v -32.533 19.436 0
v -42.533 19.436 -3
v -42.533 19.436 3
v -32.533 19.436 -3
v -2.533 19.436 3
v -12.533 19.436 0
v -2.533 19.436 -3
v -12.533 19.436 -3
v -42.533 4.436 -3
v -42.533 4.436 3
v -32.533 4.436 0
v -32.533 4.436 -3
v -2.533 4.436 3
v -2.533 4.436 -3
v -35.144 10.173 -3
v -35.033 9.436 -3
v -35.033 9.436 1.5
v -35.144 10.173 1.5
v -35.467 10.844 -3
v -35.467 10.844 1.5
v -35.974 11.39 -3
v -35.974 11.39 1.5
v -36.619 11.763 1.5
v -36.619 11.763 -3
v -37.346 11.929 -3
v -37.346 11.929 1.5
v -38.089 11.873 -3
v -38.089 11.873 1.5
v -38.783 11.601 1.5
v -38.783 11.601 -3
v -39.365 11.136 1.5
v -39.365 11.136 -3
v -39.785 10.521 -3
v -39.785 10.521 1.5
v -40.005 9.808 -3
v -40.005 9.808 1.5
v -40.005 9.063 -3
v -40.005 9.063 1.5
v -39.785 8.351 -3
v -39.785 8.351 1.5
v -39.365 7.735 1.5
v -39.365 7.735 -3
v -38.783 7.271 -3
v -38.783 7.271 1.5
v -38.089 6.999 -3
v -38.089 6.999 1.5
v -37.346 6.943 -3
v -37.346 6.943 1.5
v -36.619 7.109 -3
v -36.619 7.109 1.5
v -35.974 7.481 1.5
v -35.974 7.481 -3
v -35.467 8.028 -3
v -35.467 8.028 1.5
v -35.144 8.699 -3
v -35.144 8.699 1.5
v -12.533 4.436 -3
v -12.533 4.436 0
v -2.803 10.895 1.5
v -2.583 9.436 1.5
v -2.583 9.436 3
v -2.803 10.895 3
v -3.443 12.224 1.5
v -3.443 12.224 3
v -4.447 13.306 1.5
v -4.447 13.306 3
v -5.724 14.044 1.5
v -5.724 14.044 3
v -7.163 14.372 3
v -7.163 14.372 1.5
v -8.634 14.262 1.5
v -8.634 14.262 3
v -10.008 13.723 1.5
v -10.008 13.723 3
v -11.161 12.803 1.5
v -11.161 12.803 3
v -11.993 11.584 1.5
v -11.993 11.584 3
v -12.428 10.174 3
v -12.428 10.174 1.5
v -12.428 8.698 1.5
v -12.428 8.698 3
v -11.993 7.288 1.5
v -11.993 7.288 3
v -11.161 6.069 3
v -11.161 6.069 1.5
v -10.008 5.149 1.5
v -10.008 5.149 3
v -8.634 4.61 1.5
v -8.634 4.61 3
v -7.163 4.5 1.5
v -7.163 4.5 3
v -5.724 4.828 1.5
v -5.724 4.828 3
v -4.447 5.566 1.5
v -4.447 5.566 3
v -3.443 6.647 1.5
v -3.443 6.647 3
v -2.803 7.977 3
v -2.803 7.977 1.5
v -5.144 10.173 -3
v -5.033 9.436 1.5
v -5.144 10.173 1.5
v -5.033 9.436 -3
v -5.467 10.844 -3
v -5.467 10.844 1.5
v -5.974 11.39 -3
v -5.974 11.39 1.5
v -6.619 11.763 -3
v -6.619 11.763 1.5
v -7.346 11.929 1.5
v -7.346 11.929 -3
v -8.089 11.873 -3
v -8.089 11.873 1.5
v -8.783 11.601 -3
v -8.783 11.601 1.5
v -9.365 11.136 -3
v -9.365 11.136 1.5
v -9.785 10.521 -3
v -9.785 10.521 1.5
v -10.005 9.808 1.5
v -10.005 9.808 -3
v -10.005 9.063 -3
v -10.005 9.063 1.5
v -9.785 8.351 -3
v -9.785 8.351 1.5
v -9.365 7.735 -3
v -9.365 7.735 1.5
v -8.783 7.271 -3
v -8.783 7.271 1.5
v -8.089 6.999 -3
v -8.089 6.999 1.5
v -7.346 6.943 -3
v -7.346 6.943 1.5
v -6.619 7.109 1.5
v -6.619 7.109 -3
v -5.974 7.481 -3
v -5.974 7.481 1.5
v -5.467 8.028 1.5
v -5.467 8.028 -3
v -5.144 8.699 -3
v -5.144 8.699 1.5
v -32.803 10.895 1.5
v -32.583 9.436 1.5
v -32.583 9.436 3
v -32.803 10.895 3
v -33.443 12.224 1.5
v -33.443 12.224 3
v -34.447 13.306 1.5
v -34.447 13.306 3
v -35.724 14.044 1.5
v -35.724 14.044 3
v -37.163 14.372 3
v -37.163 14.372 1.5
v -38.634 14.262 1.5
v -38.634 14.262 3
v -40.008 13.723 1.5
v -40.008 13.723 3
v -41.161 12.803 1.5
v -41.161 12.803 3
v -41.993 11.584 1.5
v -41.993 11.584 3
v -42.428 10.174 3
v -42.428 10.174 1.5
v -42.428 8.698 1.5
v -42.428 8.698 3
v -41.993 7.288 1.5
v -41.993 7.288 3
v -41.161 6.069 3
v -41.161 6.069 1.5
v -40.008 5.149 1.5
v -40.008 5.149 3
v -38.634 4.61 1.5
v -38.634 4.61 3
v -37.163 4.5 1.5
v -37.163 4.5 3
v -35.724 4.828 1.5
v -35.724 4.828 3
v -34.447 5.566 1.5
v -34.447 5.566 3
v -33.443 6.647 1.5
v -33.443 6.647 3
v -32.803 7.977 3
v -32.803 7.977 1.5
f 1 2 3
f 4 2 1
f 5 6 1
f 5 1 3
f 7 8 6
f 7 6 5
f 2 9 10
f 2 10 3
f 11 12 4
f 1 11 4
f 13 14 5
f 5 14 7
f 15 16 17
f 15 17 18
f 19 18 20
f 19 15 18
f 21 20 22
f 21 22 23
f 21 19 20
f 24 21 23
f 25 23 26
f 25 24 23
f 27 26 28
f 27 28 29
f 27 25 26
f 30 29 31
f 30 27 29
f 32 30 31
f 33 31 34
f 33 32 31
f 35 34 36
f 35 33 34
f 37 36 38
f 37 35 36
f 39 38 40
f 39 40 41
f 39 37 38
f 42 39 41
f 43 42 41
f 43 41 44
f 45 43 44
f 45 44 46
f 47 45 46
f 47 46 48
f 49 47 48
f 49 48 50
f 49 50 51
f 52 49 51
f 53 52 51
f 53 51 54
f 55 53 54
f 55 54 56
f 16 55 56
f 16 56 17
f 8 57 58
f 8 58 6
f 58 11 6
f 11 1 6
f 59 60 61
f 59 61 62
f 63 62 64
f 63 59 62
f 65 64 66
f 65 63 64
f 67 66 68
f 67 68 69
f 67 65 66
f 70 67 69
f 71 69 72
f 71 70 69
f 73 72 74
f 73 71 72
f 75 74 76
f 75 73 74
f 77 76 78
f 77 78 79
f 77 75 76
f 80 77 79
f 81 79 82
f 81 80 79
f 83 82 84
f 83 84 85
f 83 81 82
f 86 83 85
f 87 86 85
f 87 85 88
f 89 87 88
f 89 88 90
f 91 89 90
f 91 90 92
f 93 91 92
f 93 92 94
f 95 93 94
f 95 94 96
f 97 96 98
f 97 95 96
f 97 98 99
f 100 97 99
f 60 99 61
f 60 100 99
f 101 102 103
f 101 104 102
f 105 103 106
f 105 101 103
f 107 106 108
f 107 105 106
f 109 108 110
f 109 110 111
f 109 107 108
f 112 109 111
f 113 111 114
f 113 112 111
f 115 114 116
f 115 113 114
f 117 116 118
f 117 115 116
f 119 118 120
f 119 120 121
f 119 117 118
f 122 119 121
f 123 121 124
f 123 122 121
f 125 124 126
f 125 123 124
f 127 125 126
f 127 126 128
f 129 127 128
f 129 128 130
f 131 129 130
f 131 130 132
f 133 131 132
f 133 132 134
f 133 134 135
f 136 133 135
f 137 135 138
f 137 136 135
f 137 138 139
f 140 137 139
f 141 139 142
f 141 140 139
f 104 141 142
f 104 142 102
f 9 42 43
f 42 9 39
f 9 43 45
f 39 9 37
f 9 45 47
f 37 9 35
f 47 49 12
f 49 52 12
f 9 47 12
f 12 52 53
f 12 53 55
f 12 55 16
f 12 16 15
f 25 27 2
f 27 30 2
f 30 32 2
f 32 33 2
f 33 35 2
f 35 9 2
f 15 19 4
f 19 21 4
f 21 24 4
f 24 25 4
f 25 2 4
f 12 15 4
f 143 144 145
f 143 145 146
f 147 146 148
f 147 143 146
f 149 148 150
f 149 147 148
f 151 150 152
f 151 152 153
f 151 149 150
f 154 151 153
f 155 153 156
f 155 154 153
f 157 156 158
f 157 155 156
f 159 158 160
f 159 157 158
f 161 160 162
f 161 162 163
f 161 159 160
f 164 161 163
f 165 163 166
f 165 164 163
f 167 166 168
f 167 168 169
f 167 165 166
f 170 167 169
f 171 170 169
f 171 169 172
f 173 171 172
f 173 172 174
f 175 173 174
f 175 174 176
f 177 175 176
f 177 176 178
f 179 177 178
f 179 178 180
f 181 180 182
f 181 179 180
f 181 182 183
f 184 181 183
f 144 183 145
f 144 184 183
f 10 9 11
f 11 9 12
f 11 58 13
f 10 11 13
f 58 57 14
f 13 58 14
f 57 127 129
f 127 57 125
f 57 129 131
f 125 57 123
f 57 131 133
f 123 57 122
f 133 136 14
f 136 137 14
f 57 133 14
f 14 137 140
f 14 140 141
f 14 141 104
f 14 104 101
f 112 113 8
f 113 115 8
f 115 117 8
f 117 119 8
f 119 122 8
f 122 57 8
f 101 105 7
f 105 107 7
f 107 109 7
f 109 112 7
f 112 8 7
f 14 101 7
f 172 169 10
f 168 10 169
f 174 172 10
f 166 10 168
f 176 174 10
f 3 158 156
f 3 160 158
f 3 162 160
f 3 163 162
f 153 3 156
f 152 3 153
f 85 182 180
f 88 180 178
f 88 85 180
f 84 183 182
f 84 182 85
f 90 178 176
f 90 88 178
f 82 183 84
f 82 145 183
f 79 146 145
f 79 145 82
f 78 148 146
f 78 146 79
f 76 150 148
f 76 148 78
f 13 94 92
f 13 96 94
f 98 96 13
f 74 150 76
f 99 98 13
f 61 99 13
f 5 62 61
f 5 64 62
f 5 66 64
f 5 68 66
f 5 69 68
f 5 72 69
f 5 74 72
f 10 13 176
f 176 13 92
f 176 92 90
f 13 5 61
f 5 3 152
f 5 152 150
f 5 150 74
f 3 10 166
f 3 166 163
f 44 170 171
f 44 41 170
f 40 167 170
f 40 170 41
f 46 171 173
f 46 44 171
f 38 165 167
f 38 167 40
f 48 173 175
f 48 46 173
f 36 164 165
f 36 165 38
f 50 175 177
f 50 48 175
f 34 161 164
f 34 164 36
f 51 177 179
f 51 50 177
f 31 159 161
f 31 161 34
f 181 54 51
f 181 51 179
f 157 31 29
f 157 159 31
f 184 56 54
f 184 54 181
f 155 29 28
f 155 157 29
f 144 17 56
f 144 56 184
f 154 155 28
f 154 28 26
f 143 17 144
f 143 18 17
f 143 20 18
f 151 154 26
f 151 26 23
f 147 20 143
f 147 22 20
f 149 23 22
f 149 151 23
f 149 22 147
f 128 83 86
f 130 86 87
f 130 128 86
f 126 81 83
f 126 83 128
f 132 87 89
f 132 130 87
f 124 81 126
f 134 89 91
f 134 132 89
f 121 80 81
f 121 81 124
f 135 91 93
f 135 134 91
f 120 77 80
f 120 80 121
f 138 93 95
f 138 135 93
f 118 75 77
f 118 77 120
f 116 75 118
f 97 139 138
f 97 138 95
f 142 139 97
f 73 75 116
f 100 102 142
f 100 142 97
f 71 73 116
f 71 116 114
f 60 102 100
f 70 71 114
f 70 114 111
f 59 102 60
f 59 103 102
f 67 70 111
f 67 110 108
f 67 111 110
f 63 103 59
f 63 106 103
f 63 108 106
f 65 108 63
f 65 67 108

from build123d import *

# Parameters (mm, degrees)
SKETCH1_W           = 10
SKETCH1_H           = 15
SKETCH1_R           = 4.95
SKETCH1_R_2         = 2.5
BOSS_EXTRUDE1_DEPTH = 3
BOSS_EXTRUDE2_START = -3
SKETCH1_3_W         = 10
SKETCH1_3_H         = 15
SKETCH1_3_R         = 4.95
SKETCH1_3_R_2       = 2.5
BOSS_EXTRUDE2_DEPTH = 3
CUT_EXTRUDE1_START  = 1.5
SKETCH1_4_R         = 4.95
SKETCH1_4_R_2       = 2.5
CUT_EXTRUDE1_DEPTH  = 1.5


with BuildPart() as part:
    # Sketch1 → Boss-Extrude1 (new body)
    # profile 1 of 6: a face of its own
    with BuildSketch(Plane.XY):
        with Locations((-37.532834977, 11.935892272)):
            Rectangle(SKETCH1_W, SKETCH1_H)
        with Locations((-37.532834977, 9.435892272)):
            Circle(SKETCH1_R, mode=Mode.SUBTRACT)
    # profile 2 of 6: a face of its own
    with BuildSketch(Plane.XY):
        with Locations((-37.532834977, 9.435892272)):
            Circle(SKETCH1_R)
        with Locations((-37.532834977, 9.435892272)):
            Circle(SKETCH1_R_2, mode=Mode.SUBTRACT)
    # profile 3 of 6: a face of its own
    with BuildSketch(Plane.XY):
        with Locations((-7.532834977, 11.935892272)):
            Rectangle(SKETCH1_W, SKETCH1_H)
        with Locations((-7.532834977, 9.435892272)):
            Circle(SKETCH1_R, mode=Mode.SUBTRACT)
    # profile 4 of 6: a face of its own
    with BuildSketch(Plane.XY):
        with Locations((-7.532834977, 9.435892272)):
            Circle(SKETCH1_R)
        with Locations((-7.532834977, 9.435892272)):
            Circle(SKETCH1_R_2, mode=Mode.SUBTRACT)
    # profile 5 of 6: a face of its own
    with BuildSketch(Plane.XY):
        with Locations((-17.532834977, 11.935892272)):
            Rectangle(SKETCH1_W, SKETCH1_H)
    # profile 6 of 6: a face of its own
    with BuildSketch(Plane.XY):
        with Locations((-27.532834977, 11.935892272)):
            Rectangle(SKETCH1_W, SKETCH1_H)
    extrude(amount=BOSS_EXTRUDE1_DEPTH)

    # Sketch1<3> → Boss-Extrude2 (add)
    # profile 1 of 4: a face of its own
    with BuildSketch(Plane.XY.offset(BOSS_EXTRUDE2_START)):
        with Locations((-37.532834977, 11.935892272)):
            Rectangle(SKETCH1_3_W, SKETCH1_3_H)
        with Locations((-37.532834977, 9.435892272)):
            Circle(SKETCH1_3_R, mode=Mode.SUBTRACT)
    # profile 2 of 4: a face of its own
    with BuildSketch(Plane.XY.offset(BOSS_EXTRUDE2_START)):
        with Locations((-37.532834977, 9.435892272)):
            Circle(SKETCH1_3_R)
        with Locations((-37.532834977, 9.435892272)):
            Circle(SKETCH1_3_R_2, mode=Mode.SUBTRACT)
    # profile 3 of 4: a face of its own
    with BuildSketch(Plane.XY.offset(BOSS_EXTRUDE2_START)):
        with Locations((-7.532834977, 11.935892272)):
            Rectangle(SKETCH1_3_W, SKETCH1_3_H)
        with Locations((-7.532834977, 9.435892272)):
            Circle(SKETCH1_3_R, mode=Mode.SUBTRACT)
    # profile 4 of 4: a face of its own
    with BuildSketch(Plane.XY.offset(BOSS_EXTRUDE2_START)):
        with Locations((-7.532834977, 9.435892272)):
            Circle(SKETCH1_3_R)
        with Locations((-7.532834977, 9.435892272)):
            Circle(SKETCH1_3_R_2, mode=Mode.SUBTRACT)
    extrude(amount=BOSS_EXTRUDE2_DEPTH)

    # Sketch1<4> → Cut-Extrude1 (cut)
    # profile 1 of 2: a face of its own
    with BuildSketch(Plane.XY.offset(CUT_EXTRUDE1_START)):
        with Locations((-37.532834977, 9.435892272)):
            Circle(SKETCH1_4_R)
        with Locations((-37.532834977, 9.435892272)):
            Circle(SKETCH1_4_R_2, mode=Mode.SUBTRACT)
    # profile 2 of 2: a face of its own
    with BuildSketch(Plane.XY.offset(CUT_EXTRUDE1_START)):
        with Locations((-7.532834977, 9.435892272)):
            Circle(SKETCH1_4_R)
        with Locations((-7.532834977, 9.435892272)):
            Circle(SKETCH1_4_R_2, mode=Mode.SUBTRACT)
    extrude(amount=CUT_EXTRUDE1_DEPTH, mode=Mode.SUBTRACT)


solid = part.part
